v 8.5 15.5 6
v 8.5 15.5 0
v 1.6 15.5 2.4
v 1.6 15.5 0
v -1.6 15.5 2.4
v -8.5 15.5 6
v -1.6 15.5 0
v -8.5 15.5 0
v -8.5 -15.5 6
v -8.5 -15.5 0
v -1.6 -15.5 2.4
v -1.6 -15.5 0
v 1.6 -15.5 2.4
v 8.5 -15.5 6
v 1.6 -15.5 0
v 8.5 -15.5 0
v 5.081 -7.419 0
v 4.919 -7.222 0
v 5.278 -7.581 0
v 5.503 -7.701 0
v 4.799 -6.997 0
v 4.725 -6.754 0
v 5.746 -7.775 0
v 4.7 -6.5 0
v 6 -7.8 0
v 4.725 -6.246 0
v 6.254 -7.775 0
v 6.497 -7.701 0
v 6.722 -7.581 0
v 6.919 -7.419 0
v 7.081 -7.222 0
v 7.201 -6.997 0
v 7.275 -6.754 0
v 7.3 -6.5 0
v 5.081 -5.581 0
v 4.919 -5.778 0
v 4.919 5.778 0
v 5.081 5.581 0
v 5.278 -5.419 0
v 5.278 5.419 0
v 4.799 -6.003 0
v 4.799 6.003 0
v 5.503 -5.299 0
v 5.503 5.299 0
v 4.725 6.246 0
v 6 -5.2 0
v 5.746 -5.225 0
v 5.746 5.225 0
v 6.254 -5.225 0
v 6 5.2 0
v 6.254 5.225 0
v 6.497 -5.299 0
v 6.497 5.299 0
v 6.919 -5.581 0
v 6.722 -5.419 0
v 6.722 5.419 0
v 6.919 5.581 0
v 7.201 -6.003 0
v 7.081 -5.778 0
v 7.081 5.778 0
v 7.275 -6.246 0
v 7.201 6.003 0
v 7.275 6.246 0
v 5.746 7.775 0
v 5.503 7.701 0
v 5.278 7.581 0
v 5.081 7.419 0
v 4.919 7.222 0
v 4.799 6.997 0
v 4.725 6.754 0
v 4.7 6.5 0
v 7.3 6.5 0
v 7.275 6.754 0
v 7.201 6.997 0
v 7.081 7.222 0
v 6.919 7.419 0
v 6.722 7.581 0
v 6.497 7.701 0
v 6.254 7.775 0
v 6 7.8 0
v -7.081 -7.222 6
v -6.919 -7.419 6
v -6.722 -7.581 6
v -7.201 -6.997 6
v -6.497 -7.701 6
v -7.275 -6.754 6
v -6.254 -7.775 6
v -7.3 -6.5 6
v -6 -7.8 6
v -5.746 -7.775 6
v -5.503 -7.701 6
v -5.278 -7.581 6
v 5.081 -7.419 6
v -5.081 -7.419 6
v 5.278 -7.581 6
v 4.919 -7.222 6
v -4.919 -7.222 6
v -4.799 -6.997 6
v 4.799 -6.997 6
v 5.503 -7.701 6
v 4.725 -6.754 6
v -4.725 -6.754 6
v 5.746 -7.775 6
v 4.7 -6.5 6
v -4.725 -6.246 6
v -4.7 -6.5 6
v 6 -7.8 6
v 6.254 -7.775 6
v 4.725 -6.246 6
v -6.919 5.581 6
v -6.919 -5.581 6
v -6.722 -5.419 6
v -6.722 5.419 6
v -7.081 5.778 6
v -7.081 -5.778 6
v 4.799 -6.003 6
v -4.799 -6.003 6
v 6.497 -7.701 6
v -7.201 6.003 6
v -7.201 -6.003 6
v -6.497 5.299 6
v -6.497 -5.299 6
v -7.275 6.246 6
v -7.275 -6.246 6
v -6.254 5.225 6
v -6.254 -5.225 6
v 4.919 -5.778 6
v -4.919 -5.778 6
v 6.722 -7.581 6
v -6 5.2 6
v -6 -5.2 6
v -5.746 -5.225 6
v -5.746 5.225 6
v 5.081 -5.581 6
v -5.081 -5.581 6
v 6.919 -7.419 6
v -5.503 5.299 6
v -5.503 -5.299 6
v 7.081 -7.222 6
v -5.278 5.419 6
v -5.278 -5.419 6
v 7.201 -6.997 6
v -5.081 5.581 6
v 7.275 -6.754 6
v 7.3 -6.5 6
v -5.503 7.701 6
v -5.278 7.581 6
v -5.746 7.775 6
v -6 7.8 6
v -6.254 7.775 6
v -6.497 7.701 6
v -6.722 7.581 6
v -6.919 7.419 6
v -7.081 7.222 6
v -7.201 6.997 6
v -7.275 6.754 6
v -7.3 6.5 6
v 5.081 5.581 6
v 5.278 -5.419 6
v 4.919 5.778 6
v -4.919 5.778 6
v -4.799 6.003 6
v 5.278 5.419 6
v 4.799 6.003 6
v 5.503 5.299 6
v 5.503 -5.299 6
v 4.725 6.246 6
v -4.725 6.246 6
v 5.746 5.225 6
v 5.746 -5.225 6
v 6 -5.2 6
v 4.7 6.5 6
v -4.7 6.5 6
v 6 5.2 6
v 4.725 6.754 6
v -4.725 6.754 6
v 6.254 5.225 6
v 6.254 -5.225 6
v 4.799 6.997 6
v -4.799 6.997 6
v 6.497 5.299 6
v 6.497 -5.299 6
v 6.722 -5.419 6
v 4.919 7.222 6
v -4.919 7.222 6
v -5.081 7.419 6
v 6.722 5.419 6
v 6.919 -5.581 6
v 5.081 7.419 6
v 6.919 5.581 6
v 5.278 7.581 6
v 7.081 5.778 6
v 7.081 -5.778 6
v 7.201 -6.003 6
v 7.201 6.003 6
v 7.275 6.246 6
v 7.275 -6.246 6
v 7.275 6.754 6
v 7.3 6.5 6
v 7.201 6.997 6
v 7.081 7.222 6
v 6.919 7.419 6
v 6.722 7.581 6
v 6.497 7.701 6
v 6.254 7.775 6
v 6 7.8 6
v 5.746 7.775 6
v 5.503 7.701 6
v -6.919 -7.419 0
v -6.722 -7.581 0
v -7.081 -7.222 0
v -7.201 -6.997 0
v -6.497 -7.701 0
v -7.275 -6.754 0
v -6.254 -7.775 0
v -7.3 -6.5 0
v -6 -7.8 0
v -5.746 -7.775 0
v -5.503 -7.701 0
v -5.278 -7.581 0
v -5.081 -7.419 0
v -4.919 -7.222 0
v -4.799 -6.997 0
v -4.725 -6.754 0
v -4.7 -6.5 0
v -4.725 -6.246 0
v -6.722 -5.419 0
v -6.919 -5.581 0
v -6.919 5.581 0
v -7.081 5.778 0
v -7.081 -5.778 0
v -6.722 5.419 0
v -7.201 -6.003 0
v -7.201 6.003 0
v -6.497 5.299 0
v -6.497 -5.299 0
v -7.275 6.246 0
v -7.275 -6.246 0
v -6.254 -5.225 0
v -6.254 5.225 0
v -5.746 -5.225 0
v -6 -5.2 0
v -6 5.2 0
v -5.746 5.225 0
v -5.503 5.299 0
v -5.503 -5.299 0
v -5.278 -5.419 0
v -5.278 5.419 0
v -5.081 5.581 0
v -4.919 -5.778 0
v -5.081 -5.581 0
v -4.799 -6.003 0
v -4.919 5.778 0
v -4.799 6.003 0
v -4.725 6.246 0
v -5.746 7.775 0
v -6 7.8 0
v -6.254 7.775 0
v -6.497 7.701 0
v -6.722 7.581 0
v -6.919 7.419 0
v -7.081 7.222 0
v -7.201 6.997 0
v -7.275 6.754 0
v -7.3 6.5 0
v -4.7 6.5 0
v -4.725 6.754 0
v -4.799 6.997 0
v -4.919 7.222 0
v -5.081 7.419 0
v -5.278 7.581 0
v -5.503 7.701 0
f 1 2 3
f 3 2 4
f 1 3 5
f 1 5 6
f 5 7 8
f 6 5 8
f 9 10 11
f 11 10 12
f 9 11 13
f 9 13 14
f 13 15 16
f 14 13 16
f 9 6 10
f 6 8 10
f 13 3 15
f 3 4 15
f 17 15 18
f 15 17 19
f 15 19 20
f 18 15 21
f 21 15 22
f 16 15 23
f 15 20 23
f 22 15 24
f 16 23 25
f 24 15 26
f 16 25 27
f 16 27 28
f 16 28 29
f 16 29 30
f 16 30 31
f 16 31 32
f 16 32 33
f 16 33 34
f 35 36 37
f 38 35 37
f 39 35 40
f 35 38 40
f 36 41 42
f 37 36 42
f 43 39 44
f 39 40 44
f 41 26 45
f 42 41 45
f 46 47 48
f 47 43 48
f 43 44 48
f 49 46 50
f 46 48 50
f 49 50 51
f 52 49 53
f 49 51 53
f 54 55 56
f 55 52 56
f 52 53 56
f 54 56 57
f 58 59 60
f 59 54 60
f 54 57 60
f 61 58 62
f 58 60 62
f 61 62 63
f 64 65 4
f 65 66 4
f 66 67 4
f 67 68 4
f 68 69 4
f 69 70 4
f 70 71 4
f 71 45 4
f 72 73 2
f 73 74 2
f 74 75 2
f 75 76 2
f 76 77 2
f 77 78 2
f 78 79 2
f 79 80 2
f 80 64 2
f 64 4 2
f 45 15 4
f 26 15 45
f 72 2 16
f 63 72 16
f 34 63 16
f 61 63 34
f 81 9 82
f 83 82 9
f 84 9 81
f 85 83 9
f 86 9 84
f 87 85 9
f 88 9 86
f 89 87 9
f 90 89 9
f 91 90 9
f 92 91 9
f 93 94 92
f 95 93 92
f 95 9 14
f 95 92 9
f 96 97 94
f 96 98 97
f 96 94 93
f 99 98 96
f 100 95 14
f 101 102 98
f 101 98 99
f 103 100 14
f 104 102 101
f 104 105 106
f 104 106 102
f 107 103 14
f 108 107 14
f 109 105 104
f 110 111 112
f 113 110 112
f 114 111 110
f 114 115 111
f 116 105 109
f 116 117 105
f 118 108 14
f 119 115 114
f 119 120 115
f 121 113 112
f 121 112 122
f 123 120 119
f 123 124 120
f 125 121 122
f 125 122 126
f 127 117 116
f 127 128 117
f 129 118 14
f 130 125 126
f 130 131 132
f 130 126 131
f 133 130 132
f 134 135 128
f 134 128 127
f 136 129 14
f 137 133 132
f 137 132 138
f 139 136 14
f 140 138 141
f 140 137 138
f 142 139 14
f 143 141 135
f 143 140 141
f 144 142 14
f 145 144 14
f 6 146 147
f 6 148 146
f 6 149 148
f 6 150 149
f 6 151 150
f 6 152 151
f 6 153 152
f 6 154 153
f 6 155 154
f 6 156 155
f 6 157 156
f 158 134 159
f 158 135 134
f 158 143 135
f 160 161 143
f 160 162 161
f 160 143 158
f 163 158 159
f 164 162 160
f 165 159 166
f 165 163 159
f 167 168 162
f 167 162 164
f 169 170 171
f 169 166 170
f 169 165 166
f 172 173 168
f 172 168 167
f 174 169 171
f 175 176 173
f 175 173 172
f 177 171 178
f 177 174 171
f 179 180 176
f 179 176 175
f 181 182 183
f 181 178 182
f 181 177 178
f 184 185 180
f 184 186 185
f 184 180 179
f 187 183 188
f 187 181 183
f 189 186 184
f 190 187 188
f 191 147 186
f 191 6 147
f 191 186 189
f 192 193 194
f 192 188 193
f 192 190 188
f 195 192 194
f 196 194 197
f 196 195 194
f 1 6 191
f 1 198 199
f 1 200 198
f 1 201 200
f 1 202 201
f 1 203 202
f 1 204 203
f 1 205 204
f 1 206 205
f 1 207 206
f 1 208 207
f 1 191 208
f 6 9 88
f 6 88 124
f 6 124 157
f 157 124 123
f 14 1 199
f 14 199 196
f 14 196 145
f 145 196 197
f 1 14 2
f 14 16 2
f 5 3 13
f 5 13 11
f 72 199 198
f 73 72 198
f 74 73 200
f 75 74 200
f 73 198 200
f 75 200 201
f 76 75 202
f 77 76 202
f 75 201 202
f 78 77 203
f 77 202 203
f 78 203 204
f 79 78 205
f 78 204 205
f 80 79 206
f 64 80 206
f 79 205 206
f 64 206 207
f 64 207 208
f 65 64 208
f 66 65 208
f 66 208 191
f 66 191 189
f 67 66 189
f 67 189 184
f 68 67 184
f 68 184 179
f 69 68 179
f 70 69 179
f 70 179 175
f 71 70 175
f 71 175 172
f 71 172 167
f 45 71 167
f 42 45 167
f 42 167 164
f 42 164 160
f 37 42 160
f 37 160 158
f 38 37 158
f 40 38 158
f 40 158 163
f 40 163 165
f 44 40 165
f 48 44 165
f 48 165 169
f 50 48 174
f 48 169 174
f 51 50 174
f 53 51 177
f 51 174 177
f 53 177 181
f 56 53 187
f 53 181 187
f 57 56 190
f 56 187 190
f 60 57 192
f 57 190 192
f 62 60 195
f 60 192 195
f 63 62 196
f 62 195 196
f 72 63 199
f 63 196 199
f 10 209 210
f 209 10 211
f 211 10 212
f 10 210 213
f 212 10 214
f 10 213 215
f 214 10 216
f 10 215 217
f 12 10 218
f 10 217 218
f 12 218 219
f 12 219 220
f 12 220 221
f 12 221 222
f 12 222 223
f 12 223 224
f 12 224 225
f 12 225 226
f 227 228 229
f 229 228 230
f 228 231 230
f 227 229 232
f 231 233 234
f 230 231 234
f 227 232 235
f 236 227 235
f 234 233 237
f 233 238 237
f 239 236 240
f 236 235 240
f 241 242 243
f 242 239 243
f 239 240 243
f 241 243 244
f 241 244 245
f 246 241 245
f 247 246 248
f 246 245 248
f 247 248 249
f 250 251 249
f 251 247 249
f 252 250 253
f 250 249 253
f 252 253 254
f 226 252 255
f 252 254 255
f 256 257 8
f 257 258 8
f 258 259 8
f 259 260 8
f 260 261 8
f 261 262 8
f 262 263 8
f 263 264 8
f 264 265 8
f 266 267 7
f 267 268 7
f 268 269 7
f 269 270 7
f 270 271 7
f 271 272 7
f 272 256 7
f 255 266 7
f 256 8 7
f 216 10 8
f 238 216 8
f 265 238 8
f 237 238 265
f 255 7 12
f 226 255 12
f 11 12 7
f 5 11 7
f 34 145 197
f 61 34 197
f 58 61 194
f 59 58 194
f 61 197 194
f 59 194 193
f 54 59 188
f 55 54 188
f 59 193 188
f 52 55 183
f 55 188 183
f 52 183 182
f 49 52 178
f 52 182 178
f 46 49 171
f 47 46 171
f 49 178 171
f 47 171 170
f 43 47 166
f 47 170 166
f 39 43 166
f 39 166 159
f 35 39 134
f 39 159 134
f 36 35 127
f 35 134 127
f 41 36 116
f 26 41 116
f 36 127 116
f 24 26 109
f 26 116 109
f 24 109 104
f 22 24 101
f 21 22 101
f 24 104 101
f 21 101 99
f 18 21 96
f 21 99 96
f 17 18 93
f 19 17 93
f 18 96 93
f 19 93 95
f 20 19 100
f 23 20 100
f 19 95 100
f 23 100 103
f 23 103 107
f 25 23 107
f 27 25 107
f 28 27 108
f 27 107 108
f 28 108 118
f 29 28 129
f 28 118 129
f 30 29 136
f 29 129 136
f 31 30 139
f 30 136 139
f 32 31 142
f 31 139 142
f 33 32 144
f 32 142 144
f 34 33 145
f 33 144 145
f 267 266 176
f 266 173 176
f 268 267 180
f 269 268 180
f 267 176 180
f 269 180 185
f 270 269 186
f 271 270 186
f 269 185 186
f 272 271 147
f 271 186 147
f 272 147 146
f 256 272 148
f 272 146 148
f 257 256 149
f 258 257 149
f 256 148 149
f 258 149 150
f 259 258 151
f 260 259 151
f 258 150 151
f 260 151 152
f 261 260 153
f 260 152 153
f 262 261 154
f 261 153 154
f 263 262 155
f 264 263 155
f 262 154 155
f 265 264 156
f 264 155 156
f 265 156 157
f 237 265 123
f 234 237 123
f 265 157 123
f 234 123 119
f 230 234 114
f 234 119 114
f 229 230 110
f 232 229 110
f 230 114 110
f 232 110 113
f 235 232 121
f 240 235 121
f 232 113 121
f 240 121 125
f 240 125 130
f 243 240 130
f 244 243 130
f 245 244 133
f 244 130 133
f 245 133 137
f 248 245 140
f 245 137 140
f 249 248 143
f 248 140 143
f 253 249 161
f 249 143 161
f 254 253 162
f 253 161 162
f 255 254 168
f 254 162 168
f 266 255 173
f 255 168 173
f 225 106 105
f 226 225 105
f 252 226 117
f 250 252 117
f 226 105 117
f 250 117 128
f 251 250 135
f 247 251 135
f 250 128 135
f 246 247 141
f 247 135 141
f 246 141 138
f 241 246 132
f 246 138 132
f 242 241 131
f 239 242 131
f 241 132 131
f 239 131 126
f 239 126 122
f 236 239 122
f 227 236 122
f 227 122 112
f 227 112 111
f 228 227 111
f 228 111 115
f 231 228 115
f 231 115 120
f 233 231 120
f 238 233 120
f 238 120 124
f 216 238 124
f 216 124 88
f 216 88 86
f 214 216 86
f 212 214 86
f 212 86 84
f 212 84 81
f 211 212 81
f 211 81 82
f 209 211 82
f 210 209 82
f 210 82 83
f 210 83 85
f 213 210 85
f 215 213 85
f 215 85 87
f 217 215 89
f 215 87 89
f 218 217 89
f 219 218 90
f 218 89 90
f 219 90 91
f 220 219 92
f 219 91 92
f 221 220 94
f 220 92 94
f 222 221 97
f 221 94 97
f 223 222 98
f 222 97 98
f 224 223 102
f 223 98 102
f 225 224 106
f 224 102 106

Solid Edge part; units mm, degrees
sketch "Sketch1" plane through (0, 0, 0) normal (0, 0, 1) x (1, 0, 0)
  line L0 (-8.5, -15.5) -> (8.5, -15.5)
  line L1 (8.5, -15.5) -> (8.5, 15.5)
  line L2 (8.5, 15.5) -> (-8.5, 15.5)
  line L3 (-8.5, 15.5) -> (-8.5, -15.5)
  dimension "D1" = 17
  dimension "D2" = 31
extrude "Protrusion1" add sketch "Sketch1" along normal blind 6
sketch "Sketch2" plane through (0, 0, 0) normal (0, 0, -1) x (1, 0, 0)
  line L0 (-1.6, -15.5) -> (1.6, -15.5)
  line L1 (1.6, -15.5) -> (1.6, 15.5)
  line L2 (1.6, 15.5) -> (-1.6, 15.5)
  line L3 (-1.6, 15.5) -> (-1.6, -15.5)
  dimension "D1" = 3.2
extrude "ExtrudedCutout_1" cut sketch "Sketch2" against normal blind 2.4
sketch "Sketch3" plane through (0, 0, 6) normal (0, 0, 1) x (1, 0, 0)
  circle A0 centre (-6, 6.5) radius 1.3
  circle A1 centre (-6, -6.5) radius 1.3
  circle A2 centre (6, -6.5) radius 1.3
  circle A3 centre (6, 6.5) radius 1.3
  dimension "D1" = 12
  dimension "D2" = 13
  dimension "D3" = 6
  dimension "D4" = 6.5
extrude "Cutout1" cut sketch "Sketch3" against normal up to next
